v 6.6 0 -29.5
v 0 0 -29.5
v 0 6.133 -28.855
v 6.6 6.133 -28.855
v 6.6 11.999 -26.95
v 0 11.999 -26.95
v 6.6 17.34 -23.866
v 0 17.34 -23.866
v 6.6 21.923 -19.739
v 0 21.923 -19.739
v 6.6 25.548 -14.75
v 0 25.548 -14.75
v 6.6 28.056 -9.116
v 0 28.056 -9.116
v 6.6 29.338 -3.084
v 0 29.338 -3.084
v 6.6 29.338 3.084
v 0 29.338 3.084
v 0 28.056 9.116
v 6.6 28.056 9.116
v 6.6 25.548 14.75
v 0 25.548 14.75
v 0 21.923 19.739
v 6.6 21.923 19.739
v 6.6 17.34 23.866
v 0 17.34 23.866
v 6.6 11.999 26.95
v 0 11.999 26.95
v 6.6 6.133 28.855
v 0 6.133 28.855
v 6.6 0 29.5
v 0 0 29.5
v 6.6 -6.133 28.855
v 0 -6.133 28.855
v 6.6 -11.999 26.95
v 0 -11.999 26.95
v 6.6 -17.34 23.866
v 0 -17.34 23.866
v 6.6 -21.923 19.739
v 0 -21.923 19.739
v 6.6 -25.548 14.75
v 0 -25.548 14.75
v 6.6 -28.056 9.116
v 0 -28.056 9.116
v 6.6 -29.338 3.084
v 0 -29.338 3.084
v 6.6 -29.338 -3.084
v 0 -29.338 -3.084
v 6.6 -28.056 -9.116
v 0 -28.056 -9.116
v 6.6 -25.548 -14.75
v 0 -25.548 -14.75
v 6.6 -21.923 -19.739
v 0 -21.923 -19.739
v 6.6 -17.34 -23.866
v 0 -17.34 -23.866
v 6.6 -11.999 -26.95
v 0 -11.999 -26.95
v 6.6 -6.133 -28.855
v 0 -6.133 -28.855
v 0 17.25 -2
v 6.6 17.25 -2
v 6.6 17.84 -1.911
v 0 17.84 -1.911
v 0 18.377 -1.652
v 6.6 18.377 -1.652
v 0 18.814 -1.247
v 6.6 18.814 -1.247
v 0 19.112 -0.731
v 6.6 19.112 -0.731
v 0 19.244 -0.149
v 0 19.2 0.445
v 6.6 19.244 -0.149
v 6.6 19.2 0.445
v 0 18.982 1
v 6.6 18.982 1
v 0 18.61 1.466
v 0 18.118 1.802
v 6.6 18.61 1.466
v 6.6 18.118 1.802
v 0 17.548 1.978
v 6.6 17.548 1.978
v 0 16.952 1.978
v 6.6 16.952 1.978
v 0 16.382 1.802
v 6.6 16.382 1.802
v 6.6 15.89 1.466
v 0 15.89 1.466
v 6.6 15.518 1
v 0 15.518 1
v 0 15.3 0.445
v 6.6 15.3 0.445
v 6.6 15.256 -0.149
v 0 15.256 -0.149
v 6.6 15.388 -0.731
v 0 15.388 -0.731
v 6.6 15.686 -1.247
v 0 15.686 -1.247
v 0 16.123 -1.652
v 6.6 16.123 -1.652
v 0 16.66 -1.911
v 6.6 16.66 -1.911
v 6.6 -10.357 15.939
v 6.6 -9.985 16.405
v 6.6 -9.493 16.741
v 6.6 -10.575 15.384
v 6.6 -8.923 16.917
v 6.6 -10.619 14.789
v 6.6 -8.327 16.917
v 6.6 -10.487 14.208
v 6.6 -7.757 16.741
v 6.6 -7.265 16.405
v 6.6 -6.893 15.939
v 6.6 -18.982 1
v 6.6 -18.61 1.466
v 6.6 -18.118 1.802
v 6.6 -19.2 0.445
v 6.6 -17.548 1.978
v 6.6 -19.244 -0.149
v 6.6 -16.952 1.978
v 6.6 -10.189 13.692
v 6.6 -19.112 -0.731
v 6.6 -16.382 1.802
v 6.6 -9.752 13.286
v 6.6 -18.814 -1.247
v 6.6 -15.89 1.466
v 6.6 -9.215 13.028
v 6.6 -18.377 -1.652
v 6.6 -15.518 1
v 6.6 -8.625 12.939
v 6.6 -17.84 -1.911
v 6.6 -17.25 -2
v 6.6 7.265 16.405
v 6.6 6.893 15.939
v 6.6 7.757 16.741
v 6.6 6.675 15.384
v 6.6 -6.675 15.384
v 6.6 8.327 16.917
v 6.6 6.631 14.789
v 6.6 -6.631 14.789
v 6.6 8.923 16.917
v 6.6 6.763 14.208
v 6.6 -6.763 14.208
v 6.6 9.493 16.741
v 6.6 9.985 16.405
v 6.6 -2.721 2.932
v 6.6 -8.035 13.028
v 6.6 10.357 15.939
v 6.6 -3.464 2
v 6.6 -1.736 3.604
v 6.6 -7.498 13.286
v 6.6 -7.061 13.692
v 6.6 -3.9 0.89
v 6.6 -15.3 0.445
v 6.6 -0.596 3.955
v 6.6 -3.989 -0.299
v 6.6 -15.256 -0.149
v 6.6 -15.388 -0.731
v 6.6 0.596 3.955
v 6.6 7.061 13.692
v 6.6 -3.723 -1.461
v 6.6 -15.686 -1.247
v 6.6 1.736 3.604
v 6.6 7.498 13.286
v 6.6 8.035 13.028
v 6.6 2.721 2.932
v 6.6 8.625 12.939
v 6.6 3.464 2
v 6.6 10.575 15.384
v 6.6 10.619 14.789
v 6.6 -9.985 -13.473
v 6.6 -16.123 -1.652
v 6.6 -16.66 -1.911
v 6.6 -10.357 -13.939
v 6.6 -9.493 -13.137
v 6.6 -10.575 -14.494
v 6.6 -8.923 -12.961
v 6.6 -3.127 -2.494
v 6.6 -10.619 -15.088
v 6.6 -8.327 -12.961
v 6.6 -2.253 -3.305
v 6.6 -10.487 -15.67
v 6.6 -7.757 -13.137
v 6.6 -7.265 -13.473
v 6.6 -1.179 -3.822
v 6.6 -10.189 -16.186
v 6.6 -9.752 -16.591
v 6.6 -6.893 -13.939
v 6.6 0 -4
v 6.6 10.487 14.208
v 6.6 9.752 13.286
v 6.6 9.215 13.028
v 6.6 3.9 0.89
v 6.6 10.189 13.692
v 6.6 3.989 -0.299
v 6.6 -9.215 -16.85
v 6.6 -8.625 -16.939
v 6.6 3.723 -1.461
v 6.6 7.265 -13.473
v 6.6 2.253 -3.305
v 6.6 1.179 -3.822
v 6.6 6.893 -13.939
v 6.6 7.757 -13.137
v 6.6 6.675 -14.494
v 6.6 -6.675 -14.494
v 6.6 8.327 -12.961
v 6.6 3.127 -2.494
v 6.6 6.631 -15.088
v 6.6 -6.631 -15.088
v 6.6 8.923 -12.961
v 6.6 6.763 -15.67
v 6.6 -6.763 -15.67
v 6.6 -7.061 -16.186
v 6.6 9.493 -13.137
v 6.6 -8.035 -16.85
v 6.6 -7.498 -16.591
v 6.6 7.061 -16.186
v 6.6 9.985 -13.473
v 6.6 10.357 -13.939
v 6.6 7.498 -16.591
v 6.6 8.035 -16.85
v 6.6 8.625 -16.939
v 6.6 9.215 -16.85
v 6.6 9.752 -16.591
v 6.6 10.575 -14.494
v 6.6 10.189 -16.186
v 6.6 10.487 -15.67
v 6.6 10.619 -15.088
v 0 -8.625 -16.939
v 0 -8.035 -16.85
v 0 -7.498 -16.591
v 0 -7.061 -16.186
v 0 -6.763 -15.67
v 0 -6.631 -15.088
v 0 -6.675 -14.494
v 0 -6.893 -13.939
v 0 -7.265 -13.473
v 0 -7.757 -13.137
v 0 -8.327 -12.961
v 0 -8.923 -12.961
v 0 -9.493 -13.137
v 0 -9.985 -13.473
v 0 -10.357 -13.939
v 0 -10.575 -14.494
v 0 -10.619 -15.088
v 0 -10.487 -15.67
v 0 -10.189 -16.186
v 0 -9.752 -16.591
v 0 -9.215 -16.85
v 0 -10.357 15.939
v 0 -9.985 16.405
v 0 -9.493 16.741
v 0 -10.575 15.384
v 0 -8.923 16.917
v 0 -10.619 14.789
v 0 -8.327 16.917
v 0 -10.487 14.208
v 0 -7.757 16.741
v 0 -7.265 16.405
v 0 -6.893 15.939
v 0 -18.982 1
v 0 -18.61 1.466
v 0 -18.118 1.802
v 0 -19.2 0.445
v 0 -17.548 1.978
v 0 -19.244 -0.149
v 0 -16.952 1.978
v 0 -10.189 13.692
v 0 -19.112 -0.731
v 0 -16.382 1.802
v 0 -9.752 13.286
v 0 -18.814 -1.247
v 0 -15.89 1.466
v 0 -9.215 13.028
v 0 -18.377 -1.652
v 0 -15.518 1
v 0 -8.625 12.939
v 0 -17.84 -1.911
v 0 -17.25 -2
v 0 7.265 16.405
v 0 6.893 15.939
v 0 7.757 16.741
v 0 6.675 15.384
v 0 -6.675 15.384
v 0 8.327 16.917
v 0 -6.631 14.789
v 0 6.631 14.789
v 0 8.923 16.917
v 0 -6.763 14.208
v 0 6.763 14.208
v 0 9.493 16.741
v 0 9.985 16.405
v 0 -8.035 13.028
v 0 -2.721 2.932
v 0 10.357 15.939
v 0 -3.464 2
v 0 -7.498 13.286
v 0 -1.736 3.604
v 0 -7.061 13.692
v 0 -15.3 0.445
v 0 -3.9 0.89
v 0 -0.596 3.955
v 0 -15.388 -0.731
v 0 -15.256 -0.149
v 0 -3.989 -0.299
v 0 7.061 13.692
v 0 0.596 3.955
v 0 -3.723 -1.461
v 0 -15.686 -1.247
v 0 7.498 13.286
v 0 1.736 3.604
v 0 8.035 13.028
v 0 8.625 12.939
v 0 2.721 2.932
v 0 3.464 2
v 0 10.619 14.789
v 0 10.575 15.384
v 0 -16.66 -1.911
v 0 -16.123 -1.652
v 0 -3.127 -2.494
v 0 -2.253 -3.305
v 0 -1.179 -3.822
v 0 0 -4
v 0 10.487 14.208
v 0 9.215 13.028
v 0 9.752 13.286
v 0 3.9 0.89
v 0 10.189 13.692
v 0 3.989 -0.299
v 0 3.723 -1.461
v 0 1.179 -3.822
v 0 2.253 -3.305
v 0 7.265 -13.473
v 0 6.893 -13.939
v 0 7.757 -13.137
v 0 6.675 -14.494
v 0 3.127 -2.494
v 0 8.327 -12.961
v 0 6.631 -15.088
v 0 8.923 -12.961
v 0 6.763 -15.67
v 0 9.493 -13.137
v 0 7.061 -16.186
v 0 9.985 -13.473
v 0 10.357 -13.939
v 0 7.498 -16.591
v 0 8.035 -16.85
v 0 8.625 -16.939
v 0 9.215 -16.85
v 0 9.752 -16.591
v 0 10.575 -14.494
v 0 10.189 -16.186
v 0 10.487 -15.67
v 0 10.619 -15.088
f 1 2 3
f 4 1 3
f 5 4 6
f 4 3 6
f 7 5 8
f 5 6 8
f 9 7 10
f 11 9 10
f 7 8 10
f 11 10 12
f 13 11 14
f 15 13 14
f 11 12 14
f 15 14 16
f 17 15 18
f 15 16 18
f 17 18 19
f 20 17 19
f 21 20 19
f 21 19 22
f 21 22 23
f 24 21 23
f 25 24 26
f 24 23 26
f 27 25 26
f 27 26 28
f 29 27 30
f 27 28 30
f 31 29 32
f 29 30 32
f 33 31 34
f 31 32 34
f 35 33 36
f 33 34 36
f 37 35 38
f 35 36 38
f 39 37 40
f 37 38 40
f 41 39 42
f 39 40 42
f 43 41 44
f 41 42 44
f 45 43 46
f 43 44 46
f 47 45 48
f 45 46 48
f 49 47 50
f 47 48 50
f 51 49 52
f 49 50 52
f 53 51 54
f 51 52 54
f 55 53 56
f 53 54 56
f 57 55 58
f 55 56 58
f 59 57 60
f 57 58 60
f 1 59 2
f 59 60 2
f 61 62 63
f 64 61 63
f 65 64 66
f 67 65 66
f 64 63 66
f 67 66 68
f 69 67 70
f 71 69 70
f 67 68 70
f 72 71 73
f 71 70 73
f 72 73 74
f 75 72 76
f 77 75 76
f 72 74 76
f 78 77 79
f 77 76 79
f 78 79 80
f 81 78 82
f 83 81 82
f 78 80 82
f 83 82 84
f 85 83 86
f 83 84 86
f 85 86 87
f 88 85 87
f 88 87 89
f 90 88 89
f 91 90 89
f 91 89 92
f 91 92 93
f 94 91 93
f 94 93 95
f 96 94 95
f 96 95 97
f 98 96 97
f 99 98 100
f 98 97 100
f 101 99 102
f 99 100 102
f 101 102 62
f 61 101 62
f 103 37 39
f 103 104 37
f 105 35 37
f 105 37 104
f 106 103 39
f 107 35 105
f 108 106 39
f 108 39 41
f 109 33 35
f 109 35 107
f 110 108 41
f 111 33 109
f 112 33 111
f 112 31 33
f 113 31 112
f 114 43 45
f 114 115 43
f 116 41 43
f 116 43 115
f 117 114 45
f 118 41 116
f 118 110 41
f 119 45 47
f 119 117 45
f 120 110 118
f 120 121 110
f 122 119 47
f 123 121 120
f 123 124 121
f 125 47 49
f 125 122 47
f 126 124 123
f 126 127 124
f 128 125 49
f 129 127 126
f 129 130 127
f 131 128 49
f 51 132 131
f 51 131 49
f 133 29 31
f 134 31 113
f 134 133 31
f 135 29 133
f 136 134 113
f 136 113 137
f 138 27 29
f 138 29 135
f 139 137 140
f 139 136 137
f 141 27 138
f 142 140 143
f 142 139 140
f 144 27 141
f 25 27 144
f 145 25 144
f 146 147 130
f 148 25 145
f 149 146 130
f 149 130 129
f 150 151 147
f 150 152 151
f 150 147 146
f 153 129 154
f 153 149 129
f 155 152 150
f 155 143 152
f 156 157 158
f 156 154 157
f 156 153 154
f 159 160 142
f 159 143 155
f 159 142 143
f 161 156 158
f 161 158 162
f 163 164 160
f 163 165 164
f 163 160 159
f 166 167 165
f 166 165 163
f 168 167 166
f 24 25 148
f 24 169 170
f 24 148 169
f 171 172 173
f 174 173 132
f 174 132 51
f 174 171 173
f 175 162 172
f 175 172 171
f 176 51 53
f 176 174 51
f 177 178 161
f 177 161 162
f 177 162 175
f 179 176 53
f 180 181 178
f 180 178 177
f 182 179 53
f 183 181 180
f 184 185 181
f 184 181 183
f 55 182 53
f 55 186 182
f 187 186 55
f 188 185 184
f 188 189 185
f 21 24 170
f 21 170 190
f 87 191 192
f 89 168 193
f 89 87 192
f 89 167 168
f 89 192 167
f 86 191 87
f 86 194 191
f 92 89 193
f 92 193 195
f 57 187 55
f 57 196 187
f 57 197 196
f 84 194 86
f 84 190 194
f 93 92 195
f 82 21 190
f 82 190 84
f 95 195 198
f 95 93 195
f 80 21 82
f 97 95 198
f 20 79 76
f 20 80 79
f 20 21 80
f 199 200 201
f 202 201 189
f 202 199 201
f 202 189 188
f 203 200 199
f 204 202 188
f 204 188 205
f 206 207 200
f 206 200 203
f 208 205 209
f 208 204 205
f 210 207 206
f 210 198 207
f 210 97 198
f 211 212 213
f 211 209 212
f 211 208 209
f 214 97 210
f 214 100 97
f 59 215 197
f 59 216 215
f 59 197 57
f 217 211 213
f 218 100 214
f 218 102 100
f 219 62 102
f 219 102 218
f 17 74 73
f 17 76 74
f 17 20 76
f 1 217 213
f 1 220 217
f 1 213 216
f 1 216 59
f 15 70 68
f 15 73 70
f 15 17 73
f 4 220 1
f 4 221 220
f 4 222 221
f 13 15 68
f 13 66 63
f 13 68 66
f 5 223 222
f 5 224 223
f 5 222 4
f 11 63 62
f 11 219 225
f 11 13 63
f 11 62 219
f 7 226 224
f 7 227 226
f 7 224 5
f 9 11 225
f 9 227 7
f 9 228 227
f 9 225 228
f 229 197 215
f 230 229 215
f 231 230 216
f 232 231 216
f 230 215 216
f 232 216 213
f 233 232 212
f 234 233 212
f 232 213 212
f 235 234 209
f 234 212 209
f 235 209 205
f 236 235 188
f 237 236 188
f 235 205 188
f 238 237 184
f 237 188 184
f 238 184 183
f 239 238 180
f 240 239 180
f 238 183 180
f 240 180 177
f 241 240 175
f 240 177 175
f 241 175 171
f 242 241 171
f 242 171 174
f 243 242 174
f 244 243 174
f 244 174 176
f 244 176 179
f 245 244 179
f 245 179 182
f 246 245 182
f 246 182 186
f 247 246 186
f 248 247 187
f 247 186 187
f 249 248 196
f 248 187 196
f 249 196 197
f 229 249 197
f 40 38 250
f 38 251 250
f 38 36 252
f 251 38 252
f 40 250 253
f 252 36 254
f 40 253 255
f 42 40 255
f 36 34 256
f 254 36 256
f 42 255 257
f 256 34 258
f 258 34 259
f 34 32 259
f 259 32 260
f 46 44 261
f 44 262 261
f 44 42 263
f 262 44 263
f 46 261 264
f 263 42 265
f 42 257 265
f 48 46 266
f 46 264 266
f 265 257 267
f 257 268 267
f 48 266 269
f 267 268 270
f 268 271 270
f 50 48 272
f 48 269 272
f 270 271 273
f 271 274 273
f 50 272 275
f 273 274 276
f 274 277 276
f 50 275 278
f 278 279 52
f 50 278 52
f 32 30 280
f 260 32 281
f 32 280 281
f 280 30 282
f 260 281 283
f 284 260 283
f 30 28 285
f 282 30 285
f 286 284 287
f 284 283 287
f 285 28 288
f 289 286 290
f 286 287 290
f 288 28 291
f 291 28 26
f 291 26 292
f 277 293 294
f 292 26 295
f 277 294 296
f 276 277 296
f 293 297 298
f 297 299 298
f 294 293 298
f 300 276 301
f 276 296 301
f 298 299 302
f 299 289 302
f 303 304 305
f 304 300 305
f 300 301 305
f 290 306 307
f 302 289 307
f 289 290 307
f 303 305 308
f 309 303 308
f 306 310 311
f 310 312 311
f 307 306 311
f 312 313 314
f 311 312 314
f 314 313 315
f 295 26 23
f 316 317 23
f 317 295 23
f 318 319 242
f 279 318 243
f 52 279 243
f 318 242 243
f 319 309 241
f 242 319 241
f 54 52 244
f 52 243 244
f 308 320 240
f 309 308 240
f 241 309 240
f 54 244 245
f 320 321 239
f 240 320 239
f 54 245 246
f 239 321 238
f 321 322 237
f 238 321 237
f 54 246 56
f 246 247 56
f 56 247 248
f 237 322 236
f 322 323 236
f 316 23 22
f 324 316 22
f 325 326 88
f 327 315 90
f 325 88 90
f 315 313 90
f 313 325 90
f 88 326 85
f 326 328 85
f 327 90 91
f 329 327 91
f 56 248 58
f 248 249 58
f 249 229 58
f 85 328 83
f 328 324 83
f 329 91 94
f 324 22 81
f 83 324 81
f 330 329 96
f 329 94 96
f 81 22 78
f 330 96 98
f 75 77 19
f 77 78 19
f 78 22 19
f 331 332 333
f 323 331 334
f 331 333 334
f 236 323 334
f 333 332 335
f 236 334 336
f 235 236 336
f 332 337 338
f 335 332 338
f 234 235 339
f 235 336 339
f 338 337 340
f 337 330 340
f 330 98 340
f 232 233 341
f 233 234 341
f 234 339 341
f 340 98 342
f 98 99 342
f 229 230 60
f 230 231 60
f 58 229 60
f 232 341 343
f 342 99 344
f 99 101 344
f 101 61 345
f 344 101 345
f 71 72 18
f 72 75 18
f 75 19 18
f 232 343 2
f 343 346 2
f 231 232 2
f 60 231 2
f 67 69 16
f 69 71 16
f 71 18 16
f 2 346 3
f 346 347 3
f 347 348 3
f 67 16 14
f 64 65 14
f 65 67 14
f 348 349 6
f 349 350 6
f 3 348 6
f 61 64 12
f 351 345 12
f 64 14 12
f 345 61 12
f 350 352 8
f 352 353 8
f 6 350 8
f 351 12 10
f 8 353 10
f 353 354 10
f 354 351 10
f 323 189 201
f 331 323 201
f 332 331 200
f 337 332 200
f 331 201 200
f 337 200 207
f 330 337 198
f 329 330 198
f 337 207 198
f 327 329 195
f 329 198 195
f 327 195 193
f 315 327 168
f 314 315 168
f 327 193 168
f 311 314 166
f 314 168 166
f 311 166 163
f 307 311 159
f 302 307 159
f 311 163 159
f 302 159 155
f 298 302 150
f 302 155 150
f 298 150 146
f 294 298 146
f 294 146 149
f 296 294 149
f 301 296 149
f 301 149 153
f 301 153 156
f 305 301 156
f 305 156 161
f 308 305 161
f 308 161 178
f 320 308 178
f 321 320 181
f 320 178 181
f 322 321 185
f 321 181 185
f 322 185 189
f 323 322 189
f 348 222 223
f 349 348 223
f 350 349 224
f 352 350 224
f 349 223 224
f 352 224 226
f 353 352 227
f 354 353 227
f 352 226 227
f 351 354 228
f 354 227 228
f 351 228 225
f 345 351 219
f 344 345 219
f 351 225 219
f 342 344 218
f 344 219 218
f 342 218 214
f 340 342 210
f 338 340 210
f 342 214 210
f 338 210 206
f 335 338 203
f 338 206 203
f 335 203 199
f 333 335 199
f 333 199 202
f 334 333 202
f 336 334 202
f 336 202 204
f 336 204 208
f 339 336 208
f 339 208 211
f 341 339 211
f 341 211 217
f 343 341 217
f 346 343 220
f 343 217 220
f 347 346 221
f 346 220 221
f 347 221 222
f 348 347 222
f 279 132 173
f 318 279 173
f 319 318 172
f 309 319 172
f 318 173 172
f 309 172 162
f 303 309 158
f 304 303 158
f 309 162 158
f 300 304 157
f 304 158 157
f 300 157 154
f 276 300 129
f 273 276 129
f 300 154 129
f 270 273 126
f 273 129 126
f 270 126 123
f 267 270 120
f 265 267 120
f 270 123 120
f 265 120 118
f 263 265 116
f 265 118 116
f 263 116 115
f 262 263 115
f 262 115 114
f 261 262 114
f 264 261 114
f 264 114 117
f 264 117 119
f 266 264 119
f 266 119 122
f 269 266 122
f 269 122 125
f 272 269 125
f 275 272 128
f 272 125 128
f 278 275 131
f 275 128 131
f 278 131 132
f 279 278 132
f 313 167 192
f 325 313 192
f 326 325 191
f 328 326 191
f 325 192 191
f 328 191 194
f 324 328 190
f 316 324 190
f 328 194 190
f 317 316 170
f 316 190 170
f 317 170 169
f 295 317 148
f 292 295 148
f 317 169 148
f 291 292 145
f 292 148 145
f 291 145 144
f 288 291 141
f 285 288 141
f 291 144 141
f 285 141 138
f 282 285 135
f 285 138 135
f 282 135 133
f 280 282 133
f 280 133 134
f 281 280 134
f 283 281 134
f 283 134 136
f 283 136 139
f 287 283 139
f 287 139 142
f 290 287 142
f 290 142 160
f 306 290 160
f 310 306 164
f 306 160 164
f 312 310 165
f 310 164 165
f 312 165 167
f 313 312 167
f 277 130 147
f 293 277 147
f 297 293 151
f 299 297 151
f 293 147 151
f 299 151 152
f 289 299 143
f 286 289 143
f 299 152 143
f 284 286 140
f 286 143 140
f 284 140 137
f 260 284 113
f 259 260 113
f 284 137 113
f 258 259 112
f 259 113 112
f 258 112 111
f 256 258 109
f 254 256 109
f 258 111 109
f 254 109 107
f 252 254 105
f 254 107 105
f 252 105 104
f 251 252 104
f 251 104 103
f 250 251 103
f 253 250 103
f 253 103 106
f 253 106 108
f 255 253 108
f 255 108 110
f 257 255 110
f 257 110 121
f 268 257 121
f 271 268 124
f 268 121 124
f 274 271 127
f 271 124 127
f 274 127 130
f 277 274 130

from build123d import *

# Parameters (mm, degrees)
SKETCH_1_R          = 29.5
EXTRUDE_1_DEPTH     = 6.6
SKETCH_2_R          = 2
CUT_EXTRUDE_1_DEPTH = 6.6
SKETCH_3_R          = 4
CUT_EXTRUDE_2_DEPTH = 6.6


with BuildPart() as part:
    # 草图1 → 凸台-拉伸1 (new body)
    with BuildSketch(Plane(origin=(0, 0, 0), x_dir=(0, 0, -1), z_dir=(1, 0, 0))):
        Circle(SKETCH_1_R)
    extrude(amount=EXTRUDE_1_DEPTH)

    # 草图2 → 切除-拉伸1 (cut)
    with BuildSketch(Plane(origin=(6.6, 0, 0), x_dir=(0, 0, -1), z_dir=(1, 0, 0))):
        with Locations((0, 17.25)):
            Circle(SKETCH_2_R)
        with Locations((14.938938215, 8.625)):
            Circle(SKETCH_2_R)
        with Locations((14.938938215, -8.625)):
            Circle(SKETCH_2_R)
        with Locations((0, -17.25)):
            Circle(SKETCH_2_R)
        with Locations((-14.938938215, -8.625)):
            Circle(SKETCH_2_R)
        with Locations((-14.938938215, 8.625)):
            Circle(SKETCH_2_R)
    extrude(amount=-CUT_EXTRUDE_1_DEPTH, mode=Mode.SUBTRACT)

    # 草图3 → 切除-拉伸2 (cut)
    with BuildSketch(Plane(origin=(6.6, 0, 0), x_dir=(0, 0, -1), z_dir=(1, 0, 0))):
        Circle(SKETCH_3_R)
    extrude(amount=-CUT_EXTRUDE_2_DEPTH, mode=Mode.SUBTRACT)


solid = part.part
